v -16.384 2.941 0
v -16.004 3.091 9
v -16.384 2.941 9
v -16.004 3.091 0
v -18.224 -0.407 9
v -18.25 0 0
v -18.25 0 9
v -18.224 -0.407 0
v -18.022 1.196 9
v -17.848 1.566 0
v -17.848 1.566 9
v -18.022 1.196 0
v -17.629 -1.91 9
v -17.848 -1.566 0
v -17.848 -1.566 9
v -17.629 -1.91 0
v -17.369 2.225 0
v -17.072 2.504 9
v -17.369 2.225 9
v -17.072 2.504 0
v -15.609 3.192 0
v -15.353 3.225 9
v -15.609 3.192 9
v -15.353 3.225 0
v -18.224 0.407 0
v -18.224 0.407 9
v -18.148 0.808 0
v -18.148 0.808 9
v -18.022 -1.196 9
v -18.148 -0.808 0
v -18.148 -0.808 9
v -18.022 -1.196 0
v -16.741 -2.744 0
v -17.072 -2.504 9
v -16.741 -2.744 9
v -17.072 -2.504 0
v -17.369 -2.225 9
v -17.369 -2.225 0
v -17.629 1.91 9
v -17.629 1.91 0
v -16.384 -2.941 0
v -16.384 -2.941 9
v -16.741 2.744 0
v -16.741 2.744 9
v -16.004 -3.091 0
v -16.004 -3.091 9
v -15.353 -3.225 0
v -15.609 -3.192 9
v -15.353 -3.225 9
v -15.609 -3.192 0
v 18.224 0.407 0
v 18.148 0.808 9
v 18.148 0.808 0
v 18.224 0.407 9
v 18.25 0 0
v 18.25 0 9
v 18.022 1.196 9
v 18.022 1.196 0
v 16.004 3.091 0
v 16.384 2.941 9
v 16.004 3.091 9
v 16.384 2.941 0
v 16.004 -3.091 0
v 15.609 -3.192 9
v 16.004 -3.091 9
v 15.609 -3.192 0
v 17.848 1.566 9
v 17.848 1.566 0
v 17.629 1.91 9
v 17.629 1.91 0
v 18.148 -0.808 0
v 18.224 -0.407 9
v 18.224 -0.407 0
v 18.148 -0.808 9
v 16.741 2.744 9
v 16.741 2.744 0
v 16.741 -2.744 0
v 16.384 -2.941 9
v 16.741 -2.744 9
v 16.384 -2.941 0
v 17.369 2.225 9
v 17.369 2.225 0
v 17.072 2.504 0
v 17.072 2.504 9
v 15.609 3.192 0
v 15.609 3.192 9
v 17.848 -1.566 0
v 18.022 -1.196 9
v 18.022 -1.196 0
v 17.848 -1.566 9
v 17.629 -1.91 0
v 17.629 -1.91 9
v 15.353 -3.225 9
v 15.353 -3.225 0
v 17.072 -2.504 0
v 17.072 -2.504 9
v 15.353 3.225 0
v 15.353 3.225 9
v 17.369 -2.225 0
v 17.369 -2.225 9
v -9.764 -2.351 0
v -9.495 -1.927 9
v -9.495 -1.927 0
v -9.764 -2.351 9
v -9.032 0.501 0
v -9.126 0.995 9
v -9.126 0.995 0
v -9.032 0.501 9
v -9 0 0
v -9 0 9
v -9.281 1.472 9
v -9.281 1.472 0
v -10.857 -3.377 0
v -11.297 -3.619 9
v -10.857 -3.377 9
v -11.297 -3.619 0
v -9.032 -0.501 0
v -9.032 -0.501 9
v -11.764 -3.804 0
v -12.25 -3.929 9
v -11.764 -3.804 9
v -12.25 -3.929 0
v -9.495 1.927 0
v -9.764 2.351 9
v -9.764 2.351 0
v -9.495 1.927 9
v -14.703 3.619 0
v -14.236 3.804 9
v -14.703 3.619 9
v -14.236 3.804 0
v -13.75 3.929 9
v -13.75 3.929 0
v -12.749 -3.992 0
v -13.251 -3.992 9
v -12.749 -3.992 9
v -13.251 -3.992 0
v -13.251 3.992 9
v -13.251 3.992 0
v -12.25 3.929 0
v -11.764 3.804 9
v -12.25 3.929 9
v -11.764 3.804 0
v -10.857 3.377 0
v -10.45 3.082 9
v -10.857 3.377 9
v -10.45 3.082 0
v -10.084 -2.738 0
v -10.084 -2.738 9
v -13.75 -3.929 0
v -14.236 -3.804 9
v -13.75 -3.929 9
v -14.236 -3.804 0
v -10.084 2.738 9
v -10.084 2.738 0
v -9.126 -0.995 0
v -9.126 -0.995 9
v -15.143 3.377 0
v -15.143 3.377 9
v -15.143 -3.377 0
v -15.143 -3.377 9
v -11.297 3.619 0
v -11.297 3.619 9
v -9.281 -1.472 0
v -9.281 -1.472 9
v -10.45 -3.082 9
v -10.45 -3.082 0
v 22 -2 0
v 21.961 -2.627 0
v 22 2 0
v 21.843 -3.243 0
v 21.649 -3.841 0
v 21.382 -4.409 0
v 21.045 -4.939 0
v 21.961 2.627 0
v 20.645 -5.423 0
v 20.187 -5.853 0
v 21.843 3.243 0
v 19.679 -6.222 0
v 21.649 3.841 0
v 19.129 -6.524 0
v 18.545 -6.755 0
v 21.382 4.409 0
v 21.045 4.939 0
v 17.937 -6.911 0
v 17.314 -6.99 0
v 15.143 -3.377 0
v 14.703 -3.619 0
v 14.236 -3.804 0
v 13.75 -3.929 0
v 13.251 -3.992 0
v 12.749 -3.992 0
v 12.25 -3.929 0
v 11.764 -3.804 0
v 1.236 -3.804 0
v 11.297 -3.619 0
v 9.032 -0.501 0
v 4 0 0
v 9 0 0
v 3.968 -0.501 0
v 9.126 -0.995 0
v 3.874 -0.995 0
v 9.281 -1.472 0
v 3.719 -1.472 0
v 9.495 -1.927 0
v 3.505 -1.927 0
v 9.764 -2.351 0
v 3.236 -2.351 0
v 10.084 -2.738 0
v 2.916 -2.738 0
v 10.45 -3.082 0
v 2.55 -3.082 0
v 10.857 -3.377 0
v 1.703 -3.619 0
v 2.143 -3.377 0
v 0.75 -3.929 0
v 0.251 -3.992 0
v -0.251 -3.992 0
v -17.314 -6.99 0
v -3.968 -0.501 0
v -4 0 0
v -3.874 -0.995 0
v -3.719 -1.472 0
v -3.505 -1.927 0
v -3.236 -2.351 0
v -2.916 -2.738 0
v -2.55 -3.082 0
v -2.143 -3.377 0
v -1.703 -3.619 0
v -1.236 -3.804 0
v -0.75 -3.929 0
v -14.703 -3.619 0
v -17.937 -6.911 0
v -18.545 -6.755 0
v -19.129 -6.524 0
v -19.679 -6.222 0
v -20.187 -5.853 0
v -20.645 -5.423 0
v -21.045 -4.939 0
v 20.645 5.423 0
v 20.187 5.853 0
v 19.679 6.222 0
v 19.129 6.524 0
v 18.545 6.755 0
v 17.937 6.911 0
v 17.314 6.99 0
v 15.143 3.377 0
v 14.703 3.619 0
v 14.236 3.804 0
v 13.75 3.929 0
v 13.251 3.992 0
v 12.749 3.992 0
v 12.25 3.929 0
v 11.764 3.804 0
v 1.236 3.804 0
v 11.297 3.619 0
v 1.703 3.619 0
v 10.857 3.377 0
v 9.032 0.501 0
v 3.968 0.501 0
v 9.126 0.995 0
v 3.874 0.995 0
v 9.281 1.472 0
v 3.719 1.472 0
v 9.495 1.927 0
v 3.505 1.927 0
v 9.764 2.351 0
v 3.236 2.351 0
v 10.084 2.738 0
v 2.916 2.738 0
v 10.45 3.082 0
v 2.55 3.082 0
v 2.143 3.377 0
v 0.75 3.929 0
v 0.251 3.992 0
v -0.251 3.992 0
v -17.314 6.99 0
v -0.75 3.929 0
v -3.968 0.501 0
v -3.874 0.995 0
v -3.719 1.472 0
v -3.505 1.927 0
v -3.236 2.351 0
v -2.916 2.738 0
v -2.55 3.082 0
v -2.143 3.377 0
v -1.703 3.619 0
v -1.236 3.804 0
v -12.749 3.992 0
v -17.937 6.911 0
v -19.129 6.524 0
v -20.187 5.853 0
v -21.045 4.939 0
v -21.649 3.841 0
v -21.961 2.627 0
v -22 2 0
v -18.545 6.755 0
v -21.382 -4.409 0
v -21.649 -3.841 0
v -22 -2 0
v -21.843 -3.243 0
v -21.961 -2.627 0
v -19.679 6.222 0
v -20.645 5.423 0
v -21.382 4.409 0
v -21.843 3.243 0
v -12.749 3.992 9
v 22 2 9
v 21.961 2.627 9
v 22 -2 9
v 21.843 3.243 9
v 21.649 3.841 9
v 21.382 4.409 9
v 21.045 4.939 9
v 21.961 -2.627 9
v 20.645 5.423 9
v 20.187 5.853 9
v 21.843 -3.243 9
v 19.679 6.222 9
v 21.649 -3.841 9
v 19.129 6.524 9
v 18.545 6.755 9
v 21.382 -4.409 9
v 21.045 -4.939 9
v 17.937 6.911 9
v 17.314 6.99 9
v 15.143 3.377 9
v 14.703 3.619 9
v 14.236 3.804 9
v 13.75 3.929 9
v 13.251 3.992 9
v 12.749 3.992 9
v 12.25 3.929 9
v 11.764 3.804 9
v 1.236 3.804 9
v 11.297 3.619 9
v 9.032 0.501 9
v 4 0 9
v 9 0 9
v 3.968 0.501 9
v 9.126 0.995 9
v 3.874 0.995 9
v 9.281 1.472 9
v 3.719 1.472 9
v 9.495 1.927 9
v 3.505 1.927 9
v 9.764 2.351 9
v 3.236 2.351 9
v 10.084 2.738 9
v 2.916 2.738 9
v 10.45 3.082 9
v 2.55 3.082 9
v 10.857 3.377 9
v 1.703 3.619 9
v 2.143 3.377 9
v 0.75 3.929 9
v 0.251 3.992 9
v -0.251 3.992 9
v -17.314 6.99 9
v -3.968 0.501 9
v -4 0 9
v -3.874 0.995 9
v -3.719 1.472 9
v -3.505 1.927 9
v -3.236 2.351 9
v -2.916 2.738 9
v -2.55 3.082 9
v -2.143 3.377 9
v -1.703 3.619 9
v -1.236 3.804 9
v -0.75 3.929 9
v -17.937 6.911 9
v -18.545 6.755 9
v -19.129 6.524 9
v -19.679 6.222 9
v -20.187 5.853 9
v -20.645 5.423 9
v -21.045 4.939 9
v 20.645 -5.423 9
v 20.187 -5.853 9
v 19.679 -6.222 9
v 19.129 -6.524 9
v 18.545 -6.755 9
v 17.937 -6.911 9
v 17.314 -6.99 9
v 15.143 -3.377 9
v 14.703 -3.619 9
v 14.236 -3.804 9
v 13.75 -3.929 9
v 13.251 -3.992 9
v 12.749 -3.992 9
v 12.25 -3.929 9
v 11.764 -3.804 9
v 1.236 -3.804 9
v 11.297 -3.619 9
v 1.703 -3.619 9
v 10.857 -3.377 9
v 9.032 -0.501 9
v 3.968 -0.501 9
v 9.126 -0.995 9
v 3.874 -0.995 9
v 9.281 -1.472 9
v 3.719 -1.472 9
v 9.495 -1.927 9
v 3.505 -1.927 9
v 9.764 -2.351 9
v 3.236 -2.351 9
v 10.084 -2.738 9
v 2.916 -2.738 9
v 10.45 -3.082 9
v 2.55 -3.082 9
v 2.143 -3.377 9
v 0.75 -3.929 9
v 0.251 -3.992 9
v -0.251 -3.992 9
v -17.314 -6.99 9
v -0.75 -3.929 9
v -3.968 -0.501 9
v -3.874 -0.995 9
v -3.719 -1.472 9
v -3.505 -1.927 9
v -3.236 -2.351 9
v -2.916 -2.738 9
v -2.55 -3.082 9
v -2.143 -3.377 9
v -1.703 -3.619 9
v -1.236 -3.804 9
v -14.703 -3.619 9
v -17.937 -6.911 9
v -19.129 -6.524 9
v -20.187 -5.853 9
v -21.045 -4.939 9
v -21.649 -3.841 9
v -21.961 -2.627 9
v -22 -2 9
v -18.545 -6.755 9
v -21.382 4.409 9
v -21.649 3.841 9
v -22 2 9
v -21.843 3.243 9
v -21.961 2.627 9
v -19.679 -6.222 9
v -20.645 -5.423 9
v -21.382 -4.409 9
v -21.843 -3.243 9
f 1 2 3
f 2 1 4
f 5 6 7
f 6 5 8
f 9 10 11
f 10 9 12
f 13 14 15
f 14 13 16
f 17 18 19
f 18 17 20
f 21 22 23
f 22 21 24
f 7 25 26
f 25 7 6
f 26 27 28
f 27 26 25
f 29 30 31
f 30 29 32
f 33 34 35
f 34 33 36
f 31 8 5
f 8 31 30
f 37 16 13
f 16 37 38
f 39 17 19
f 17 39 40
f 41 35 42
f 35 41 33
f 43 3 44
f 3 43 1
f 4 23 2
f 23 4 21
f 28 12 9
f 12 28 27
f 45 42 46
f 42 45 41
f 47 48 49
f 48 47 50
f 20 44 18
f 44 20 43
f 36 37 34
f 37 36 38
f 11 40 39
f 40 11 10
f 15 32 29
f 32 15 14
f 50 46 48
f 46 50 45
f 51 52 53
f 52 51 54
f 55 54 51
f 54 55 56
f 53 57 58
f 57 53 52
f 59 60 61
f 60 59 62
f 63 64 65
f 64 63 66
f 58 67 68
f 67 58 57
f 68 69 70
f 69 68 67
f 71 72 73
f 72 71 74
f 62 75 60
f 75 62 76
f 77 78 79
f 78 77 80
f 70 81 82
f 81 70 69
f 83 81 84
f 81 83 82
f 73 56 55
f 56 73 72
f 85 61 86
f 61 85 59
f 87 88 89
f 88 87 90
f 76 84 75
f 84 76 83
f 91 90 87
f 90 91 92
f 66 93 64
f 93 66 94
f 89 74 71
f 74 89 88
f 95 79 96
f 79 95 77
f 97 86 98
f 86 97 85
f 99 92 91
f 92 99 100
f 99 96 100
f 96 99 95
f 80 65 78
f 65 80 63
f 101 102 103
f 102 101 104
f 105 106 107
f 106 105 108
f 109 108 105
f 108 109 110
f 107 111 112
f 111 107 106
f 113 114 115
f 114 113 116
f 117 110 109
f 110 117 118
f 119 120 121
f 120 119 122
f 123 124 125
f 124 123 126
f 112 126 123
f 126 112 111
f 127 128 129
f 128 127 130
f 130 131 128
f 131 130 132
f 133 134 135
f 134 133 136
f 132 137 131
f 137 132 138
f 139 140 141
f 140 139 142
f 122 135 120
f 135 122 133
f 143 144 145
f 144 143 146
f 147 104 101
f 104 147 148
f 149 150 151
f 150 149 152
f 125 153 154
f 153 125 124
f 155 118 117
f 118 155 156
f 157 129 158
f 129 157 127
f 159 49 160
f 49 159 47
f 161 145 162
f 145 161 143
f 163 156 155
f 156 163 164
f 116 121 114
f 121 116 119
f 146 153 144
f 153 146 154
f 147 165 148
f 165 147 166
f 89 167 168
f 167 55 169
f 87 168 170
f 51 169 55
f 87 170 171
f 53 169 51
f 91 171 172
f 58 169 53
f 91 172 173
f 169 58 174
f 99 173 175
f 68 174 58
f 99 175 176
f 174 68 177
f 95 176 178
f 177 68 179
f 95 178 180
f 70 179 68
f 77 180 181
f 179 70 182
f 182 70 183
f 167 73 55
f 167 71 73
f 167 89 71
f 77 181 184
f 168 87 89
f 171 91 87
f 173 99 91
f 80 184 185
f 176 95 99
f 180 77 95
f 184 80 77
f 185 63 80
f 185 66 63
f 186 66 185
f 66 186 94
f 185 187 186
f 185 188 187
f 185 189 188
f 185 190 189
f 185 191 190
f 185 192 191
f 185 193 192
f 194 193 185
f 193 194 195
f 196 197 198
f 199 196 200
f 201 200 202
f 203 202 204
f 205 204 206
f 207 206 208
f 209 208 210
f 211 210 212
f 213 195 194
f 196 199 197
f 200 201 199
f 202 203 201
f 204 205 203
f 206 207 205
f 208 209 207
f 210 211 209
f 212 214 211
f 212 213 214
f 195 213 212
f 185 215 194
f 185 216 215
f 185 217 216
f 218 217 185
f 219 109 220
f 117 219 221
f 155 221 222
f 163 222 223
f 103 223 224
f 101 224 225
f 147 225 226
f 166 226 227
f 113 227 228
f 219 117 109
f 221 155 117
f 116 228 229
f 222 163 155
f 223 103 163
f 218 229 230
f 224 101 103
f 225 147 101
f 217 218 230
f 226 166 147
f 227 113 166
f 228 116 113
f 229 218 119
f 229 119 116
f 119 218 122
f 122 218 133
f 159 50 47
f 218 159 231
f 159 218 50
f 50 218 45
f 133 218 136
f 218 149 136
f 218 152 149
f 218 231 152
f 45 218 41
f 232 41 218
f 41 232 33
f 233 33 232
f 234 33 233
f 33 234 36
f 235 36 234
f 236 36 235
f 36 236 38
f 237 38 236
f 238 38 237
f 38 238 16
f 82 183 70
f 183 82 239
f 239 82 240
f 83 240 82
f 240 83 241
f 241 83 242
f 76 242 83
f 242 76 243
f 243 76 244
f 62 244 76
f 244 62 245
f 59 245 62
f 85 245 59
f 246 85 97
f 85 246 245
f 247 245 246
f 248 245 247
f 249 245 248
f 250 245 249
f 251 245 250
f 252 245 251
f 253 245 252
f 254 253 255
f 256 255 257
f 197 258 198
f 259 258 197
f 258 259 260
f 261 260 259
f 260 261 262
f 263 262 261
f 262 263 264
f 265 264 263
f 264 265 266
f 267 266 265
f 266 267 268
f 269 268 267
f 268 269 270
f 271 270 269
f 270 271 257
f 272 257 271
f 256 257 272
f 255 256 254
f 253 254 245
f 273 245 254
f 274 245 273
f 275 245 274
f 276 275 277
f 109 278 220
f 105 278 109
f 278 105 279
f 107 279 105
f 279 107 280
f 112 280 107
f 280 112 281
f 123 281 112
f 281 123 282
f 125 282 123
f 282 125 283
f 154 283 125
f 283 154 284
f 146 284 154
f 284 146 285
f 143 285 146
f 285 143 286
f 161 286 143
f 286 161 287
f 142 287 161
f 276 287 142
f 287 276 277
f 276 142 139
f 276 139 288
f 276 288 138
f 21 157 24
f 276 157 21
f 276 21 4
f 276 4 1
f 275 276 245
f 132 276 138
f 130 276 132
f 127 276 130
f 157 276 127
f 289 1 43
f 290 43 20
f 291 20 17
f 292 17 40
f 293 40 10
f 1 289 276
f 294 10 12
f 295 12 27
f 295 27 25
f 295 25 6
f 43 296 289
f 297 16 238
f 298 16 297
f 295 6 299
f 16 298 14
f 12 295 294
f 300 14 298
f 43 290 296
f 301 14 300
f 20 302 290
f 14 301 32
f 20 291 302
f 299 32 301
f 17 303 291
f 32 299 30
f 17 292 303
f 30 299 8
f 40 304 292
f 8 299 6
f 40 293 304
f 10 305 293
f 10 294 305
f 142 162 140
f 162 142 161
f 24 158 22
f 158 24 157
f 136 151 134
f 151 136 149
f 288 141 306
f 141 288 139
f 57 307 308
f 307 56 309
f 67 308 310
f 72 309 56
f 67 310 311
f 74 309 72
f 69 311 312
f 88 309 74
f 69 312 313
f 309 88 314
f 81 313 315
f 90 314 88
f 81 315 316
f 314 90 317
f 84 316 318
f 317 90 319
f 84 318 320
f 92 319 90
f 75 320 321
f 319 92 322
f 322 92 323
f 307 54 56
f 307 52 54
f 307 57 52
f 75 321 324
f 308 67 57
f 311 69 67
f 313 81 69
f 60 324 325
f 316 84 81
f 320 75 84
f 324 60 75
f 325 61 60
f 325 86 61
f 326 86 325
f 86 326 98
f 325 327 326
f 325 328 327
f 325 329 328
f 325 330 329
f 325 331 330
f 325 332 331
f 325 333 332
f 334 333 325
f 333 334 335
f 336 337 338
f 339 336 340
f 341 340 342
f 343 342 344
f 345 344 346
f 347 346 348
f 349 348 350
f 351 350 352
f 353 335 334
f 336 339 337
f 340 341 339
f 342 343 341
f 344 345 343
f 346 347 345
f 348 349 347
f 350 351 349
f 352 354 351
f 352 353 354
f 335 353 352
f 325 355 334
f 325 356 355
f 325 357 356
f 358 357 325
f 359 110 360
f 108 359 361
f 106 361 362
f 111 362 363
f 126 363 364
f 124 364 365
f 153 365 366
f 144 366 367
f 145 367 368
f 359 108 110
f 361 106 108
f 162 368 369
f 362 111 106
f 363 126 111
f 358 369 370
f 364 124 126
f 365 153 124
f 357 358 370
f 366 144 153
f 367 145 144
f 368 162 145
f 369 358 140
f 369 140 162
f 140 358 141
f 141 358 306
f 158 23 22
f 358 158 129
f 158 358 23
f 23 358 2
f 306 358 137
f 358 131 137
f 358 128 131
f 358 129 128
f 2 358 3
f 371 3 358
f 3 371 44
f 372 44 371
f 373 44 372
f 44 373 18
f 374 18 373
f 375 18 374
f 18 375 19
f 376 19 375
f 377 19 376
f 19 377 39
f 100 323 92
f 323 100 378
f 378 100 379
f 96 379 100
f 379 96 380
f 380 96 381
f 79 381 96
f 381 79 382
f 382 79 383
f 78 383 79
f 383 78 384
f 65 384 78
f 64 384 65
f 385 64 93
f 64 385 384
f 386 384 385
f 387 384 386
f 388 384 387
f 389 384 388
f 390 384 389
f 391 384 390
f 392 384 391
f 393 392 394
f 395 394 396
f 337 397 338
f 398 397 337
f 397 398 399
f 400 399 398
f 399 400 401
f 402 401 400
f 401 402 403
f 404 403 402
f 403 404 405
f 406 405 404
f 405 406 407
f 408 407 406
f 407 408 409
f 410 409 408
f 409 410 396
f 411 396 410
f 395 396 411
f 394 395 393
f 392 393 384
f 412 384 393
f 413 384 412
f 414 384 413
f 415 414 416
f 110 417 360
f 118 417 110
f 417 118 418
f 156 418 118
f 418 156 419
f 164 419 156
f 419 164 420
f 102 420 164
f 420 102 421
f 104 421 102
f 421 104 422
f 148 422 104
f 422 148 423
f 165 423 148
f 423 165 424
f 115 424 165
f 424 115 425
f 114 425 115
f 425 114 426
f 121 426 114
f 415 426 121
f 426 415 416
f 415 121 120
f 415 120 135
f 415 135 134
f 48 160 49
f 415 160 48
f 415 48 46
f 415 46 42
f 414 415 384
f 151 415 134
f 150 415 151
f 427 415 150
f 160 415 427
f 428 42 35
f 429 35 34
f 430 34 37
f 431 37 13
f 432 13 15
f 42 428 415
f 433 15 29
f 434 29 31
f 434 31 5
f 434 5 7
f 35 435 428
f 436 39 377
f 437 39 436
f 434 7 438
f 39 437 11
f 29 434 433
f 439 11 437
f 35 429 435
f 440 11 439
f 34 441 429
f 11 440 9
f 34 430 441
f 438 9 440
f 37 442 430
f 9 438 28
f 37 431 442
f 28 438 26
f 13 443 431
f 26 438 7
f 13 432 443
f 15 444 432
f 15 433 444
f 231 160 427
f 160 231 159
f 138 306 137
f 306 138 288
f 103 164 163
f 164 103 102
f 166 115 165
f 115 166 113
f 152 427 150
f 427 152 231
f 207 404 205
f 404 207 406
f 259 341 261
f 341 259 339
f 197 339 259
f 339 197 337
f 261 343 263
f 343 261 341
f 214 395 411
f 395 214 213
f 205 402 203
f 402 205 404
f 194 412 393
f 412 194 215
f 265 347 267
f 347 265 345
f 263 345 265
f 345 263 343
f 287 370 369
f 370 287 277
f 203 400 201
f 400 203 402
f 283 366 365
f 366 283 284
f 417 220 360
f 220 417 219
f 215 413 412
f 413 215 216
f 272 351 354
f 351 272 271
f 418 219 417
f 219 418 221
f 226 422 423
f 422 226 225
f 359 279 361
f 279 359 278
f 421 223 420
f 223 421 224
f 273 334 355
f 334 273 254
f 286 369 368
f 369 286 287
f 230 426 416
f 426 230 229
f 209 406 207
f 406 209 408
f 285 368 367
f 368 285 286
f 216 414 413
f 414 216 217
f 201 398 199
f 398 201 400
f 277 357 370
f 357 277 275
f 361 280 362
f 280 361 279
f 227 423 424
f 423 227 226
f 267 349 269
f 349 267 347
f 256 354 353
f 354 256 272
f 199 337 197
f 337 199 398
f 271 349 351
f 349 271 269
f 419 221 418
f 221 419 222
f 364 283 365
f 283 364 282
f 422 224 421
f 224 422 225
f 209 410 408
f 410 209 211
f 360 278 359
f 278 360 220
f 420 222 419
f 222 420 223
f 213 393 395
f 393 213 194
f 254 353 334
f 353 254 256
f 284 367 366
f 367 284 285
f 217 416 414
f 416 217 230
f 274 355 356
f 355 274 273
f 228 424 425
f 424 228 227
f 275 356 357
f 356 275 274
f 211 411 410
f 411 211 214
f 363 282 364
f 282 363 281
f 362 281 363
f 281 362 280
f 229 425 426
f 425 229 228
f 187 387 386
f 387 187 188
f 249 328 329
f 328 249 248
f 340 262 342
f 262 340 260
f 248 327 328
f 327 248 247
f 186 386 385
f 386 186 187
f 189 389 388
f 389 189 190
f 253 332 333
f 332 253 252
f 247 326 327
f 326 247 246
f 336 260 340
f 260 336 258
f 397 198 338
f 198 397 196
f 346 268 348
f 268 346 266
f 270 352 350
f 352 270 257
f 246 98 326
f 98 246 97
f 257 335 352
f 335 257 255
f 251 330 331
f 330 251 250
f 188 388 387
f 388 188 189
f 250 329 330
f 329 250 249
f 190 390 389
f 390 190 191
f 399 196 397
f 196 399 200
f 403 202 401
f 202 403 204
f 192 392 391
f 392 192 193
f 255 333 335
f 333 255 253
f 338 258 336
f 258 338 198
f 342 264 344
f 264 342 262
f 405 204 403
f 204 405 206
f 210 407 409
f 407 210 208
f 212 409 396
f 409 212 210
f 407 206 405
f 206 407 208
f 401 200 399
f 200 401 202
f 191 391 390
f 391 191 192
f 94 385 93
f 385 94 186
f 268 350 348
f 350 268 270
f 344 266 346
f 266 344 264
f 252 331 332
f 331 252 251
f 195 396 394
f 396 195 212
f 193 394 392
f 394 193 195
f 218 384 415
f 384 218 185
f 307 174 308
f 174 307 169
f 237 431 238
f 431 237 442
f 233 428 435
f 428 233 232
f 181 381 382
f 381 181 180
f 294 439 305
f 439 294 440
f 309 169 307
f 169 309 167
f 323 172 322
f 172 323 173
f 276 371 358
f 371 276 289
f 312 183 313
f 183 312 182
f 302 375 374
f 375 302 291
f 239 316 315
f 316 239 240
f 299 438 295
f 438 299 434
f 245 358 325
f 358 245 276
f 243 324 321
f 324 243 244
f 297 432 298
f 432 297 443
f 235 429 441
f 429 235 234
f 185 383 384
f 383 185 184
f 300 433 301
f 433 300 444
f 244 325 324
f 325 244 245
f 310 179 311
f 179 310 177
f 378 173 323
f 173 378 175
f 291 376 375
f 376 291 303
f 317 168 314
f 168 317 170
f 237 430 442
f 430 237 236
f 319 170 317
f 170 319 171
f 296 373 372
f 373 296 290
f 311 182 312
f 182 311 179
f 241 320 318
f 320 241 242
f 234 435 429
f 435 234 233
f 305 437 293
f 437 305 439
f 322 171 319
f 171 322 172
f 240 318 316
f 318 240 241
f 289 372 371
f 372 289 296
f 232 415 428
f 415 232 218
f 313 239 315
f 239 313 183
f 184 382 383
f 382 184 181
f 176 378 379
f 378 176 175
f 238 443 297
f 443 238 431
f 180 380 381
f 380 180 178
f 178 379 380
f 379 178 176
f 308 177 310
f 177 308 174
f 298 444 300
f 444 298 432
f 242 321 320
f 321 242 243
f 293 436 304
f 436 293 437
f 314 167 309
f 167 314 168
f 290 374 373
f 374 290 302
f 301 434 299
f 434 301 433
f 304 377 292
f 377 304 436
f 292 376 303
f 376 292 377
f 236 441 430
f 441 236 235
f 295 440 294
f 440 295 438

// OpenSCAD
$fn = 50;

difference() {
	union() {
		hull() {
			translate(v = [-17.0, 2.0, 0]) {
				cylinder(h = 9, r = 5);
			}
			translate(v = [17.0, 2.0, 0]) {
				cylinder(h = 9, r = 5);
			}
			translate(v = [-17.0, -2.0, 0]) {
				cylinder(h = 9, r = 5);
			}
			translate(v = [17.0, -2.0, 0]) {
				cylinder(h = 9, r = 5);
			}
		}
	}
	union() {
		translate(v = [-15.0, 0.0, -100.0]) {
			cylinder(h = 200, r = 3.25);
		}
		translate(v = [15.0, 0.0, -100.0]) {
			cylinder(h = 200, r = 3.25);
		}
		translate(v = [-15.0, 0.0, -100.0]) {
			cylinder(h = 200, r = 1.8);
		}
		translate(v = [15.0, 0.0, -100.0]) {
			cylinder(h = 200, r = 1.8);
		}
		translate(v = [-13.0, 0, 0.0]) {
			cylinder(h = 9, r = 4.0);
		}
		cylinder(h = 9, r = 4.0);
		translate(v = [13.0, 0, 0.0]) {
			cylinder(h = 9, r = 4.0);
		}
	}
}
